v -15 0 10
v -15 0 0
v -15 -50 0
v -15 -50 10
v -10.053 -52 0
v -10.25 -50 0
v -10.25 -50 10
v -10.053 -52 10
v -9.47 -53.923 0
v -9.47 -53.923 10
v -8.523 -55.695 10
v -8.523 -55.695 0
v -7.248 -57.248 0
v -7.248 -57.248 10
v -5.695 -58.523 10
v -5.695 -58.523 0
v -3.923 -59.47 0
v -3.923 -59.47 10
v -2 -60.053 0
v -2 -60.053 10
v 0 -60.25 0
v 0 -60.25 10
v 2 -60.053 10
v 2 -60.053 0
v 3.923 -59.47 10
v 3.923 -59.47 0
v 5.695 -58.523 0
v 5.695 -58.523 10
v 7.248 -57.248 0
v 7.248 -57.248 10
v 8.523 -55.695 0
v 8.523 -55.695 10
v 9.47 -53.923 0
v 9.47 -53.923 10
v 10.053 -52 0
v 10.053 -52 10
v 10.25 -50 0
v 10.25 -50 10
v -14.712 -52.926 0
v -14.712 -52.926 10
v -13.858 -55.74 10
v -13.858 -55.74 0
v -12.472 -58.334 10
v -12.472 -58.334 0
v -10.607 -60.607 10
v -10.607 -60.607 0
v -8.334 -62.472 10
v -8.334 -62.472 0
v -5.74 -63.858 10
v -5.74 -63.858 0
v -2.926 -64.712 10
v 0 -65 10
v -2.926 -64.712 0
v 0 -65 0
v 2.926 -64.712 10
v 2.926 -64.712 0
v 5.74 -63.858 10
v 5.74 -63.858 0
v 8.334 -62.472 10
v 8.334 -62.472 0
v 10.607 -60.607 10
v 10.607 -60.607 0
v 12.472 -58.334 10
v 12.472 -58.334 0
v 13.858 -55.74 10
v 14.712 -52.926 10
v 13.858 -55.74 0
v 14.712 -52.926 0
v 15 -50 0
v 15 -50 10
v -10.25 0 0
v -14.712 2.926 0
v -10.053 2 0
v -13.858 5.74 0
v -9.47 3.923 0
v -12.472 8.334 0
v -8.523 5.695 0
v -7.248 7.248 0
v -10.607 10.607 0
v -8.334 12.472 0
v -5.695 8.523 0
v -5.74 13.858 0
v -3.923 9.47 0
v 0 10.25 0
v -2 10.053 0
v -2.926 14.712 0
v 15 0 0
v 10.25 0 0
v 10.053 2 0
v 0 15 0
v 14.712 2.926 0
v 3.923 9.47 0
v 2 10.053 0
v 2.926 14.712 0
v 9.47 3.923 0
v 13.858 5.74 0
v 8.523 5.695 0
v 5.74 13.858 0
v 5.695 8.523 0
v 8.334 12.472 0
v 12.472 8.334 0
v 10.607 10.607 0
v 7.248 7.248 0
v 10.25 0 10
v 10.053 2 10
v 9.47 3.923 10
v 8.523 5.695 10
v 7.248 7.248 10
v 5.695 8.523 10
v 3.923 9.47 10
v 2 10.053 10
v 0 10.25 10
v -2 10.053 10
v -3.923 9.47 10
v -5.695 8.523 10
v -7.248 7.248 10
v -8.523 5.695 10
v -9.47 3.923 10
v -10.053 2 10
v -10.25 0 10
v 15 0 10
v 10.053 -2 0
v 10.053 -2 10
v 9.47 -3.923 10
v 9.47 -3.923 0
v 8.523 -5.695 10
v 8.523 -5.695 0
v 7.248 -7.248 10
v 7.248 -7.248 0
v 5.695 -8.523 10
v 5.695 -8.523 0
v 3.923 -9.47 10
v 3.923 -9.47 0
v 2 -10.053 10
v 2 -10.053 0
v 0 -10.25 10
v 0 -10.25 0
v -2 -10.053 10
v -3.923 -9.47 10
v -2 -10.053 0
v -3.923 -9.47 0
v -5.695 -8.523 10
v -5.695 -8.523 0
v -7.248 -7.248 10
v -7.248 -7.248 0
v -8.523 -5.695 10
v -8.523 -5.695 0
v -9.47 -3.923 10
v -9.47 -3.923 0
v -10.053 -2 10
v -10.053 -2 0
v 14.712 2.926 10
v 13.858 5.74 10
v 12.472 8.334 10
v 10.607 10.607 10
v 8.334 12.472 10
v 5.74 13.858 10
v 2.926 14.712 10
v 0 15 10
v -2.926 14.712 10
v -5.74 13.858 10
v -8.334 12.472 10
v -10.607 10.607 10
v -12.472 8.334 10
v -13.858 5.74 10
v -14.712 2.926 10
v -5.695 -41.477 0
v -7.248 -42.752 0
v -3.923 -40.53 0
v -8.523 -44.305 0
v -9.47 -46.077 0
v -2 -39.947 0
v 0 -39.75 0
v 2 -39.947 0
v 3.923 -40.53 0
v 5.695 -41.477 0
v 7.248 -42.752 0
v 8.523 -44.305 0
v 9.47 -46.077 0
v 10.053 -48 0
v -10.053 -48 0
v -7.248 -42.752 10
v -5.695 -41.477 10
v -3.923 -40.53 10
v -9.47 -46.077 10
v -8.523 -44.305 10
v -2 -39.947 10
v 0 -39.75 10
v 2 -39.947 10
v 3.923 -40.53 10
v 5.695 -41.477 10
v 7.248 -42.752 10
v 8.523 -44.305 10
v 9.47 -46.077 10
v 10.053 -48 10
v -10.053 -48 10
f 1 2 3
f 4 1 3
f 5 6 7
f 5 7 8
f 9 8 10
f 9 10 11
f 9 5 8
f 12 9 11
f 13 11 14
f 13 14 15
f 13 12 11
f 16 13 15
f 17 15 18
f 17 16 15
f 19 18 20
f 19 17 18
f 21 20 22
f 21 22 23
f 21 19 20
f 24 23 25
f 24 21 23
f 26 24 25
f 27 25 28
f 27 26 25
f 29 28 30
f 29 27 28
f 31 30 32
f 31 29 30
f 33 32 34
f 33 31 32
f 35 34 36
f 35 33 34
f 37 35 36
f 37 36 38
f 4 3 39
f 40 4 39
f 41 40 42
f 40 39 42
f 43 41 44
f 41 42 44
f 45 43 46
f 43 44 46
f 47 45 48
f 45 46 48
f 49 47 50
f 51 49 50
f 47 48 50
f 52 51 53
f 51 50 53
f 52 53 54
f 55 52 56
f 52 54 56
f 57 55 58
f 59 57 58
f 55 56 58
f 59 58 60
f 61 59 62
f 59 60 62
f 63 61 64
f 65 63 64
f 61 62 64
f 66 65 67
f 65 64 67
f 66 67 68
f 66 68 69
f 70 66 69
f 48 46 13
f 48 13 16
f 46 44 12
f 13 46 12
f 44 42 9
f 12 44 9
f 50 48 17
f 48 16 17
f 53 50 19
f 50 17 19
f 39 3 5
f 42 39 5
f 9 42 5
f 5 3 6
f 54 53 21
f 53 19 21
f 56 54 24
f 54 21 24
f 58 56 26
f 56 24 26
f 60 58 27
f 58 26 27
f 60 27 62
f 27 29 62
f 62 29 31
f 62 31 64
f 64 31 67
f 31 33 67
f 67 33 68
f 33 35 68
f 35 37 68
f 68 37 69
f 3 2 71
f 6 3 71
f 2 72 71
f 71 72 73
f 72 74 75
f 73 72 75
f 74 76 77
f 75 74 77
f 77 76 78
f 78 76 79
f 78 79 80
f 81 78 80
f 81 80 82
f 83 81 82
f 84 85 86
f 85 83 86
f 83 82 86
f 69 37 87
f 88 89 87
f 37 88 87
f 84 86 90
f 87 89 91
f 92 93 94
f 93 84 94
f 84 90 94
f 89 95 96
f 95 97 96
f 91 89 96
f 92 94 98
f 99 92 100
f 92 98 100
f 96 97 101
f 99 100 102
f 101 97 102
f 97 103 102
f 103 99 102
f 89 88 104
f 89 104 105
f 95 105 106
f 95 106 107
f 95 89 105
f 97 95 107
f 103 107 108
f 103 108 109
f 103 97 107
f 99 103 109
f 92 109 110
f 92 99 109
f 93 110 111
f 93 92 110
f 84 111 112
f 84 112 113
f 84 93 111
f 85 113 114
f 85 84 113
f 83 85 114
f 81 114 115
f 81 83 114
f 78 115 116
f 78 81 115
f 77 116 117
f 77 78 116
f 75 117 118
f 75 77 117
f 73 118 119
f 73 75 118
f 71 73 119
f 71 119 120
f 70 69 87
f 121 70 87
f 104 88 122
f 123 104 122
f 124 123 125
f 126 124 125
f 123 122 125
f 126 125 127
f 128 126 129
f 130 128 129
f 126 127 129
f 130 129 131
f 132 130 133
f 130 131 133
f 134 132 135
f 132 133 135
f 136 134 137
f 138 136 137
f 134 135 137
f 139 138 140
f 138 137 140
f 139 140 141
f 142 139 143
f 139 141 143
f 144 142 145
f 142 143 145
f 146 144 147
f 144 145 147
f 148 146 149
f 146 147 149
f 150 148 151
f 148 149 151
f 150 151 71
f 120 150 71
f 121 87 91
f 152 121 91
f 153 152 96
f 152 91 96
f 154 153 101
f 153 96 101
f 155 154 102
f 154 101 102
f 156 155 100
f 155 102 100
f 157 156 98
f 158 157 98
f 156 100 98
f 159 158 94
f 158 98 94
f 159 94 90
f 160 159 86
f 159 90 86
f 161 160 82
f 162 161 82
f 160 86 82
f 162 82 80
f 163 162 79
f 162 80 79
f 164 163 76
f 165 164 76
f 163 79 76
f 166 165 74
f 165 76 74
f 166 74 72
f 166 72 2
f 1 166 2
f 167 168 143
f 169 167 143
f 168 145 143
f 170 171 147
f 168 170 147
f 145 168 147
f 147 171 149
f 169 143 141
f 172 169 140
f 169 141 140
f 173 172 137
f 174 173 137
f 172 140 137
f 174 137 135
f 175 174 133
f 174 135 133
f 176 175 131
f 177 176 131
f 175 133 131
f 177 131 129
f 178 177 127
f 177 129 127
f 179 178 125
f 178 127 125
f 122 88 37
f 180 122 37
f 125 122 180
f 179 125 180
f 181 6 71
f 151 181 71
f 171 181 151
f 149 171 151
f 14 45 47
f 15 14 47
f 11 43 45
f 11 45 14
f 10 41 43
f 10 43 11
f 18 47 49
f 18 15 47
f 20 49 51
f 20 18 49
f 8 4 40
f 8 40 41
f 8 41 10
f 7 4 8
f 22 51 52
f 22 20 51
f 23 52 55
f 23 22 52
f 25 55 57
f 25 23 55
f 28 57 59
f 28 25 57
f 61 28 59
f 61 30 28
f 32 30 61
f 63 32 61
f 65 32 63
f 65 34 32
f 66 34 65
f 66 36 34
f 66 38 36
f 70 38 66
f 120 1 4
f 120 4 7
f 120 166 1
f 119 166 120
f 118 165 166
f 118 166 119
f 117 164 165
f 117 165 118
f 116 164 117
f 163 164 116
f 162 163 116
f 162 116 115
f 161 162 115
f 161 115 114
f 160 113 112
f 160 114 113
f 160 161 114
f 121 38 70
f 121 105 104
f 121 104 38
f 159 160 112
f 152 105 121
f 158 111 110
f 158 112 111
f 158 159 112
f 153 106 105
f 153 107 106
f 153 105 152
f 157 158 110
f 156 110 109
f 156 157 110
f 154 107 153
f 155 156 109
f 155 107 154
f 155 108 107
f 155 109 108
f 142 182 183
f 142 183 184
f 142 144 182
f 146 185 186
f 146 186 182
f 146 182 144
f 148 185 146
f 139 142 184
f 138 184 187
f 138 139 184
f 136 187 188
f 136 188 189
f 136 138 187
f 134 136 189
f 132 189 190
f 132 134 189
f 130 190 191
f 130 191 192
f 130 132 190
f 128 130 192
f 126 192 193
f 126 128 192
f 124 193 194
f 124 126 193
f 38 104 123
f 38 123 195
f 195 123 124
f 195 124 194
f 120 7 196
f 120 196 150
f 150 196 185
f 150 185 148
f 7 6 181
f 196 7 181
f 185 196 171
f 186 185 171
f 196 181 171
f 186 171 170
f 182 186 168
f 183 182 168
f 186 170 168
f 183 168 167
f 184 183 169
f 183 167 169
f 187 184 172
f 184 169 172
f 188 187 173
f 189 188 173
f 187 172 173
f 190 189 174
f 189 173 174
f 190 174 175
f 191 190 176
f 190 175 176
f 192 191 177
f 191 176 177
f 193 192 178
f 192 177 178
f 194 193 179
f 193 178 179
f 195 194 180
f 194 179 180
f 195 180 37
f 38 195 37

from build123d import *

# Parameters (mm, degrees)
SKETCH1_R           = 10.25
BOSS_EXTRUDE1_DEPTH = 10


with BuildPart() as part:
    # Sketch1 → Boss-Extrude1 (new body)
    with BuildSketch(Plane.XY):
        with BuildLine():
            Line((15, -50), (15, 0))
            ThreePointArc((15, 0), (0, 15), (-15, 0))
            Line((-15, 0), (-15, -50))
            ThreePointArc((-15, -50), (0, -65), (15, -50))
        make_face()
        with Locations((0, -50)):
            Circle(SKETCH1_R, mode=Mode.SUBTRACT)
        Circle(SKETCH1_R, mode=Mode.SUBTRACT)
    extrude(amount=BOSS_EXTRUDE1_DEPTH)


solid = part.part
